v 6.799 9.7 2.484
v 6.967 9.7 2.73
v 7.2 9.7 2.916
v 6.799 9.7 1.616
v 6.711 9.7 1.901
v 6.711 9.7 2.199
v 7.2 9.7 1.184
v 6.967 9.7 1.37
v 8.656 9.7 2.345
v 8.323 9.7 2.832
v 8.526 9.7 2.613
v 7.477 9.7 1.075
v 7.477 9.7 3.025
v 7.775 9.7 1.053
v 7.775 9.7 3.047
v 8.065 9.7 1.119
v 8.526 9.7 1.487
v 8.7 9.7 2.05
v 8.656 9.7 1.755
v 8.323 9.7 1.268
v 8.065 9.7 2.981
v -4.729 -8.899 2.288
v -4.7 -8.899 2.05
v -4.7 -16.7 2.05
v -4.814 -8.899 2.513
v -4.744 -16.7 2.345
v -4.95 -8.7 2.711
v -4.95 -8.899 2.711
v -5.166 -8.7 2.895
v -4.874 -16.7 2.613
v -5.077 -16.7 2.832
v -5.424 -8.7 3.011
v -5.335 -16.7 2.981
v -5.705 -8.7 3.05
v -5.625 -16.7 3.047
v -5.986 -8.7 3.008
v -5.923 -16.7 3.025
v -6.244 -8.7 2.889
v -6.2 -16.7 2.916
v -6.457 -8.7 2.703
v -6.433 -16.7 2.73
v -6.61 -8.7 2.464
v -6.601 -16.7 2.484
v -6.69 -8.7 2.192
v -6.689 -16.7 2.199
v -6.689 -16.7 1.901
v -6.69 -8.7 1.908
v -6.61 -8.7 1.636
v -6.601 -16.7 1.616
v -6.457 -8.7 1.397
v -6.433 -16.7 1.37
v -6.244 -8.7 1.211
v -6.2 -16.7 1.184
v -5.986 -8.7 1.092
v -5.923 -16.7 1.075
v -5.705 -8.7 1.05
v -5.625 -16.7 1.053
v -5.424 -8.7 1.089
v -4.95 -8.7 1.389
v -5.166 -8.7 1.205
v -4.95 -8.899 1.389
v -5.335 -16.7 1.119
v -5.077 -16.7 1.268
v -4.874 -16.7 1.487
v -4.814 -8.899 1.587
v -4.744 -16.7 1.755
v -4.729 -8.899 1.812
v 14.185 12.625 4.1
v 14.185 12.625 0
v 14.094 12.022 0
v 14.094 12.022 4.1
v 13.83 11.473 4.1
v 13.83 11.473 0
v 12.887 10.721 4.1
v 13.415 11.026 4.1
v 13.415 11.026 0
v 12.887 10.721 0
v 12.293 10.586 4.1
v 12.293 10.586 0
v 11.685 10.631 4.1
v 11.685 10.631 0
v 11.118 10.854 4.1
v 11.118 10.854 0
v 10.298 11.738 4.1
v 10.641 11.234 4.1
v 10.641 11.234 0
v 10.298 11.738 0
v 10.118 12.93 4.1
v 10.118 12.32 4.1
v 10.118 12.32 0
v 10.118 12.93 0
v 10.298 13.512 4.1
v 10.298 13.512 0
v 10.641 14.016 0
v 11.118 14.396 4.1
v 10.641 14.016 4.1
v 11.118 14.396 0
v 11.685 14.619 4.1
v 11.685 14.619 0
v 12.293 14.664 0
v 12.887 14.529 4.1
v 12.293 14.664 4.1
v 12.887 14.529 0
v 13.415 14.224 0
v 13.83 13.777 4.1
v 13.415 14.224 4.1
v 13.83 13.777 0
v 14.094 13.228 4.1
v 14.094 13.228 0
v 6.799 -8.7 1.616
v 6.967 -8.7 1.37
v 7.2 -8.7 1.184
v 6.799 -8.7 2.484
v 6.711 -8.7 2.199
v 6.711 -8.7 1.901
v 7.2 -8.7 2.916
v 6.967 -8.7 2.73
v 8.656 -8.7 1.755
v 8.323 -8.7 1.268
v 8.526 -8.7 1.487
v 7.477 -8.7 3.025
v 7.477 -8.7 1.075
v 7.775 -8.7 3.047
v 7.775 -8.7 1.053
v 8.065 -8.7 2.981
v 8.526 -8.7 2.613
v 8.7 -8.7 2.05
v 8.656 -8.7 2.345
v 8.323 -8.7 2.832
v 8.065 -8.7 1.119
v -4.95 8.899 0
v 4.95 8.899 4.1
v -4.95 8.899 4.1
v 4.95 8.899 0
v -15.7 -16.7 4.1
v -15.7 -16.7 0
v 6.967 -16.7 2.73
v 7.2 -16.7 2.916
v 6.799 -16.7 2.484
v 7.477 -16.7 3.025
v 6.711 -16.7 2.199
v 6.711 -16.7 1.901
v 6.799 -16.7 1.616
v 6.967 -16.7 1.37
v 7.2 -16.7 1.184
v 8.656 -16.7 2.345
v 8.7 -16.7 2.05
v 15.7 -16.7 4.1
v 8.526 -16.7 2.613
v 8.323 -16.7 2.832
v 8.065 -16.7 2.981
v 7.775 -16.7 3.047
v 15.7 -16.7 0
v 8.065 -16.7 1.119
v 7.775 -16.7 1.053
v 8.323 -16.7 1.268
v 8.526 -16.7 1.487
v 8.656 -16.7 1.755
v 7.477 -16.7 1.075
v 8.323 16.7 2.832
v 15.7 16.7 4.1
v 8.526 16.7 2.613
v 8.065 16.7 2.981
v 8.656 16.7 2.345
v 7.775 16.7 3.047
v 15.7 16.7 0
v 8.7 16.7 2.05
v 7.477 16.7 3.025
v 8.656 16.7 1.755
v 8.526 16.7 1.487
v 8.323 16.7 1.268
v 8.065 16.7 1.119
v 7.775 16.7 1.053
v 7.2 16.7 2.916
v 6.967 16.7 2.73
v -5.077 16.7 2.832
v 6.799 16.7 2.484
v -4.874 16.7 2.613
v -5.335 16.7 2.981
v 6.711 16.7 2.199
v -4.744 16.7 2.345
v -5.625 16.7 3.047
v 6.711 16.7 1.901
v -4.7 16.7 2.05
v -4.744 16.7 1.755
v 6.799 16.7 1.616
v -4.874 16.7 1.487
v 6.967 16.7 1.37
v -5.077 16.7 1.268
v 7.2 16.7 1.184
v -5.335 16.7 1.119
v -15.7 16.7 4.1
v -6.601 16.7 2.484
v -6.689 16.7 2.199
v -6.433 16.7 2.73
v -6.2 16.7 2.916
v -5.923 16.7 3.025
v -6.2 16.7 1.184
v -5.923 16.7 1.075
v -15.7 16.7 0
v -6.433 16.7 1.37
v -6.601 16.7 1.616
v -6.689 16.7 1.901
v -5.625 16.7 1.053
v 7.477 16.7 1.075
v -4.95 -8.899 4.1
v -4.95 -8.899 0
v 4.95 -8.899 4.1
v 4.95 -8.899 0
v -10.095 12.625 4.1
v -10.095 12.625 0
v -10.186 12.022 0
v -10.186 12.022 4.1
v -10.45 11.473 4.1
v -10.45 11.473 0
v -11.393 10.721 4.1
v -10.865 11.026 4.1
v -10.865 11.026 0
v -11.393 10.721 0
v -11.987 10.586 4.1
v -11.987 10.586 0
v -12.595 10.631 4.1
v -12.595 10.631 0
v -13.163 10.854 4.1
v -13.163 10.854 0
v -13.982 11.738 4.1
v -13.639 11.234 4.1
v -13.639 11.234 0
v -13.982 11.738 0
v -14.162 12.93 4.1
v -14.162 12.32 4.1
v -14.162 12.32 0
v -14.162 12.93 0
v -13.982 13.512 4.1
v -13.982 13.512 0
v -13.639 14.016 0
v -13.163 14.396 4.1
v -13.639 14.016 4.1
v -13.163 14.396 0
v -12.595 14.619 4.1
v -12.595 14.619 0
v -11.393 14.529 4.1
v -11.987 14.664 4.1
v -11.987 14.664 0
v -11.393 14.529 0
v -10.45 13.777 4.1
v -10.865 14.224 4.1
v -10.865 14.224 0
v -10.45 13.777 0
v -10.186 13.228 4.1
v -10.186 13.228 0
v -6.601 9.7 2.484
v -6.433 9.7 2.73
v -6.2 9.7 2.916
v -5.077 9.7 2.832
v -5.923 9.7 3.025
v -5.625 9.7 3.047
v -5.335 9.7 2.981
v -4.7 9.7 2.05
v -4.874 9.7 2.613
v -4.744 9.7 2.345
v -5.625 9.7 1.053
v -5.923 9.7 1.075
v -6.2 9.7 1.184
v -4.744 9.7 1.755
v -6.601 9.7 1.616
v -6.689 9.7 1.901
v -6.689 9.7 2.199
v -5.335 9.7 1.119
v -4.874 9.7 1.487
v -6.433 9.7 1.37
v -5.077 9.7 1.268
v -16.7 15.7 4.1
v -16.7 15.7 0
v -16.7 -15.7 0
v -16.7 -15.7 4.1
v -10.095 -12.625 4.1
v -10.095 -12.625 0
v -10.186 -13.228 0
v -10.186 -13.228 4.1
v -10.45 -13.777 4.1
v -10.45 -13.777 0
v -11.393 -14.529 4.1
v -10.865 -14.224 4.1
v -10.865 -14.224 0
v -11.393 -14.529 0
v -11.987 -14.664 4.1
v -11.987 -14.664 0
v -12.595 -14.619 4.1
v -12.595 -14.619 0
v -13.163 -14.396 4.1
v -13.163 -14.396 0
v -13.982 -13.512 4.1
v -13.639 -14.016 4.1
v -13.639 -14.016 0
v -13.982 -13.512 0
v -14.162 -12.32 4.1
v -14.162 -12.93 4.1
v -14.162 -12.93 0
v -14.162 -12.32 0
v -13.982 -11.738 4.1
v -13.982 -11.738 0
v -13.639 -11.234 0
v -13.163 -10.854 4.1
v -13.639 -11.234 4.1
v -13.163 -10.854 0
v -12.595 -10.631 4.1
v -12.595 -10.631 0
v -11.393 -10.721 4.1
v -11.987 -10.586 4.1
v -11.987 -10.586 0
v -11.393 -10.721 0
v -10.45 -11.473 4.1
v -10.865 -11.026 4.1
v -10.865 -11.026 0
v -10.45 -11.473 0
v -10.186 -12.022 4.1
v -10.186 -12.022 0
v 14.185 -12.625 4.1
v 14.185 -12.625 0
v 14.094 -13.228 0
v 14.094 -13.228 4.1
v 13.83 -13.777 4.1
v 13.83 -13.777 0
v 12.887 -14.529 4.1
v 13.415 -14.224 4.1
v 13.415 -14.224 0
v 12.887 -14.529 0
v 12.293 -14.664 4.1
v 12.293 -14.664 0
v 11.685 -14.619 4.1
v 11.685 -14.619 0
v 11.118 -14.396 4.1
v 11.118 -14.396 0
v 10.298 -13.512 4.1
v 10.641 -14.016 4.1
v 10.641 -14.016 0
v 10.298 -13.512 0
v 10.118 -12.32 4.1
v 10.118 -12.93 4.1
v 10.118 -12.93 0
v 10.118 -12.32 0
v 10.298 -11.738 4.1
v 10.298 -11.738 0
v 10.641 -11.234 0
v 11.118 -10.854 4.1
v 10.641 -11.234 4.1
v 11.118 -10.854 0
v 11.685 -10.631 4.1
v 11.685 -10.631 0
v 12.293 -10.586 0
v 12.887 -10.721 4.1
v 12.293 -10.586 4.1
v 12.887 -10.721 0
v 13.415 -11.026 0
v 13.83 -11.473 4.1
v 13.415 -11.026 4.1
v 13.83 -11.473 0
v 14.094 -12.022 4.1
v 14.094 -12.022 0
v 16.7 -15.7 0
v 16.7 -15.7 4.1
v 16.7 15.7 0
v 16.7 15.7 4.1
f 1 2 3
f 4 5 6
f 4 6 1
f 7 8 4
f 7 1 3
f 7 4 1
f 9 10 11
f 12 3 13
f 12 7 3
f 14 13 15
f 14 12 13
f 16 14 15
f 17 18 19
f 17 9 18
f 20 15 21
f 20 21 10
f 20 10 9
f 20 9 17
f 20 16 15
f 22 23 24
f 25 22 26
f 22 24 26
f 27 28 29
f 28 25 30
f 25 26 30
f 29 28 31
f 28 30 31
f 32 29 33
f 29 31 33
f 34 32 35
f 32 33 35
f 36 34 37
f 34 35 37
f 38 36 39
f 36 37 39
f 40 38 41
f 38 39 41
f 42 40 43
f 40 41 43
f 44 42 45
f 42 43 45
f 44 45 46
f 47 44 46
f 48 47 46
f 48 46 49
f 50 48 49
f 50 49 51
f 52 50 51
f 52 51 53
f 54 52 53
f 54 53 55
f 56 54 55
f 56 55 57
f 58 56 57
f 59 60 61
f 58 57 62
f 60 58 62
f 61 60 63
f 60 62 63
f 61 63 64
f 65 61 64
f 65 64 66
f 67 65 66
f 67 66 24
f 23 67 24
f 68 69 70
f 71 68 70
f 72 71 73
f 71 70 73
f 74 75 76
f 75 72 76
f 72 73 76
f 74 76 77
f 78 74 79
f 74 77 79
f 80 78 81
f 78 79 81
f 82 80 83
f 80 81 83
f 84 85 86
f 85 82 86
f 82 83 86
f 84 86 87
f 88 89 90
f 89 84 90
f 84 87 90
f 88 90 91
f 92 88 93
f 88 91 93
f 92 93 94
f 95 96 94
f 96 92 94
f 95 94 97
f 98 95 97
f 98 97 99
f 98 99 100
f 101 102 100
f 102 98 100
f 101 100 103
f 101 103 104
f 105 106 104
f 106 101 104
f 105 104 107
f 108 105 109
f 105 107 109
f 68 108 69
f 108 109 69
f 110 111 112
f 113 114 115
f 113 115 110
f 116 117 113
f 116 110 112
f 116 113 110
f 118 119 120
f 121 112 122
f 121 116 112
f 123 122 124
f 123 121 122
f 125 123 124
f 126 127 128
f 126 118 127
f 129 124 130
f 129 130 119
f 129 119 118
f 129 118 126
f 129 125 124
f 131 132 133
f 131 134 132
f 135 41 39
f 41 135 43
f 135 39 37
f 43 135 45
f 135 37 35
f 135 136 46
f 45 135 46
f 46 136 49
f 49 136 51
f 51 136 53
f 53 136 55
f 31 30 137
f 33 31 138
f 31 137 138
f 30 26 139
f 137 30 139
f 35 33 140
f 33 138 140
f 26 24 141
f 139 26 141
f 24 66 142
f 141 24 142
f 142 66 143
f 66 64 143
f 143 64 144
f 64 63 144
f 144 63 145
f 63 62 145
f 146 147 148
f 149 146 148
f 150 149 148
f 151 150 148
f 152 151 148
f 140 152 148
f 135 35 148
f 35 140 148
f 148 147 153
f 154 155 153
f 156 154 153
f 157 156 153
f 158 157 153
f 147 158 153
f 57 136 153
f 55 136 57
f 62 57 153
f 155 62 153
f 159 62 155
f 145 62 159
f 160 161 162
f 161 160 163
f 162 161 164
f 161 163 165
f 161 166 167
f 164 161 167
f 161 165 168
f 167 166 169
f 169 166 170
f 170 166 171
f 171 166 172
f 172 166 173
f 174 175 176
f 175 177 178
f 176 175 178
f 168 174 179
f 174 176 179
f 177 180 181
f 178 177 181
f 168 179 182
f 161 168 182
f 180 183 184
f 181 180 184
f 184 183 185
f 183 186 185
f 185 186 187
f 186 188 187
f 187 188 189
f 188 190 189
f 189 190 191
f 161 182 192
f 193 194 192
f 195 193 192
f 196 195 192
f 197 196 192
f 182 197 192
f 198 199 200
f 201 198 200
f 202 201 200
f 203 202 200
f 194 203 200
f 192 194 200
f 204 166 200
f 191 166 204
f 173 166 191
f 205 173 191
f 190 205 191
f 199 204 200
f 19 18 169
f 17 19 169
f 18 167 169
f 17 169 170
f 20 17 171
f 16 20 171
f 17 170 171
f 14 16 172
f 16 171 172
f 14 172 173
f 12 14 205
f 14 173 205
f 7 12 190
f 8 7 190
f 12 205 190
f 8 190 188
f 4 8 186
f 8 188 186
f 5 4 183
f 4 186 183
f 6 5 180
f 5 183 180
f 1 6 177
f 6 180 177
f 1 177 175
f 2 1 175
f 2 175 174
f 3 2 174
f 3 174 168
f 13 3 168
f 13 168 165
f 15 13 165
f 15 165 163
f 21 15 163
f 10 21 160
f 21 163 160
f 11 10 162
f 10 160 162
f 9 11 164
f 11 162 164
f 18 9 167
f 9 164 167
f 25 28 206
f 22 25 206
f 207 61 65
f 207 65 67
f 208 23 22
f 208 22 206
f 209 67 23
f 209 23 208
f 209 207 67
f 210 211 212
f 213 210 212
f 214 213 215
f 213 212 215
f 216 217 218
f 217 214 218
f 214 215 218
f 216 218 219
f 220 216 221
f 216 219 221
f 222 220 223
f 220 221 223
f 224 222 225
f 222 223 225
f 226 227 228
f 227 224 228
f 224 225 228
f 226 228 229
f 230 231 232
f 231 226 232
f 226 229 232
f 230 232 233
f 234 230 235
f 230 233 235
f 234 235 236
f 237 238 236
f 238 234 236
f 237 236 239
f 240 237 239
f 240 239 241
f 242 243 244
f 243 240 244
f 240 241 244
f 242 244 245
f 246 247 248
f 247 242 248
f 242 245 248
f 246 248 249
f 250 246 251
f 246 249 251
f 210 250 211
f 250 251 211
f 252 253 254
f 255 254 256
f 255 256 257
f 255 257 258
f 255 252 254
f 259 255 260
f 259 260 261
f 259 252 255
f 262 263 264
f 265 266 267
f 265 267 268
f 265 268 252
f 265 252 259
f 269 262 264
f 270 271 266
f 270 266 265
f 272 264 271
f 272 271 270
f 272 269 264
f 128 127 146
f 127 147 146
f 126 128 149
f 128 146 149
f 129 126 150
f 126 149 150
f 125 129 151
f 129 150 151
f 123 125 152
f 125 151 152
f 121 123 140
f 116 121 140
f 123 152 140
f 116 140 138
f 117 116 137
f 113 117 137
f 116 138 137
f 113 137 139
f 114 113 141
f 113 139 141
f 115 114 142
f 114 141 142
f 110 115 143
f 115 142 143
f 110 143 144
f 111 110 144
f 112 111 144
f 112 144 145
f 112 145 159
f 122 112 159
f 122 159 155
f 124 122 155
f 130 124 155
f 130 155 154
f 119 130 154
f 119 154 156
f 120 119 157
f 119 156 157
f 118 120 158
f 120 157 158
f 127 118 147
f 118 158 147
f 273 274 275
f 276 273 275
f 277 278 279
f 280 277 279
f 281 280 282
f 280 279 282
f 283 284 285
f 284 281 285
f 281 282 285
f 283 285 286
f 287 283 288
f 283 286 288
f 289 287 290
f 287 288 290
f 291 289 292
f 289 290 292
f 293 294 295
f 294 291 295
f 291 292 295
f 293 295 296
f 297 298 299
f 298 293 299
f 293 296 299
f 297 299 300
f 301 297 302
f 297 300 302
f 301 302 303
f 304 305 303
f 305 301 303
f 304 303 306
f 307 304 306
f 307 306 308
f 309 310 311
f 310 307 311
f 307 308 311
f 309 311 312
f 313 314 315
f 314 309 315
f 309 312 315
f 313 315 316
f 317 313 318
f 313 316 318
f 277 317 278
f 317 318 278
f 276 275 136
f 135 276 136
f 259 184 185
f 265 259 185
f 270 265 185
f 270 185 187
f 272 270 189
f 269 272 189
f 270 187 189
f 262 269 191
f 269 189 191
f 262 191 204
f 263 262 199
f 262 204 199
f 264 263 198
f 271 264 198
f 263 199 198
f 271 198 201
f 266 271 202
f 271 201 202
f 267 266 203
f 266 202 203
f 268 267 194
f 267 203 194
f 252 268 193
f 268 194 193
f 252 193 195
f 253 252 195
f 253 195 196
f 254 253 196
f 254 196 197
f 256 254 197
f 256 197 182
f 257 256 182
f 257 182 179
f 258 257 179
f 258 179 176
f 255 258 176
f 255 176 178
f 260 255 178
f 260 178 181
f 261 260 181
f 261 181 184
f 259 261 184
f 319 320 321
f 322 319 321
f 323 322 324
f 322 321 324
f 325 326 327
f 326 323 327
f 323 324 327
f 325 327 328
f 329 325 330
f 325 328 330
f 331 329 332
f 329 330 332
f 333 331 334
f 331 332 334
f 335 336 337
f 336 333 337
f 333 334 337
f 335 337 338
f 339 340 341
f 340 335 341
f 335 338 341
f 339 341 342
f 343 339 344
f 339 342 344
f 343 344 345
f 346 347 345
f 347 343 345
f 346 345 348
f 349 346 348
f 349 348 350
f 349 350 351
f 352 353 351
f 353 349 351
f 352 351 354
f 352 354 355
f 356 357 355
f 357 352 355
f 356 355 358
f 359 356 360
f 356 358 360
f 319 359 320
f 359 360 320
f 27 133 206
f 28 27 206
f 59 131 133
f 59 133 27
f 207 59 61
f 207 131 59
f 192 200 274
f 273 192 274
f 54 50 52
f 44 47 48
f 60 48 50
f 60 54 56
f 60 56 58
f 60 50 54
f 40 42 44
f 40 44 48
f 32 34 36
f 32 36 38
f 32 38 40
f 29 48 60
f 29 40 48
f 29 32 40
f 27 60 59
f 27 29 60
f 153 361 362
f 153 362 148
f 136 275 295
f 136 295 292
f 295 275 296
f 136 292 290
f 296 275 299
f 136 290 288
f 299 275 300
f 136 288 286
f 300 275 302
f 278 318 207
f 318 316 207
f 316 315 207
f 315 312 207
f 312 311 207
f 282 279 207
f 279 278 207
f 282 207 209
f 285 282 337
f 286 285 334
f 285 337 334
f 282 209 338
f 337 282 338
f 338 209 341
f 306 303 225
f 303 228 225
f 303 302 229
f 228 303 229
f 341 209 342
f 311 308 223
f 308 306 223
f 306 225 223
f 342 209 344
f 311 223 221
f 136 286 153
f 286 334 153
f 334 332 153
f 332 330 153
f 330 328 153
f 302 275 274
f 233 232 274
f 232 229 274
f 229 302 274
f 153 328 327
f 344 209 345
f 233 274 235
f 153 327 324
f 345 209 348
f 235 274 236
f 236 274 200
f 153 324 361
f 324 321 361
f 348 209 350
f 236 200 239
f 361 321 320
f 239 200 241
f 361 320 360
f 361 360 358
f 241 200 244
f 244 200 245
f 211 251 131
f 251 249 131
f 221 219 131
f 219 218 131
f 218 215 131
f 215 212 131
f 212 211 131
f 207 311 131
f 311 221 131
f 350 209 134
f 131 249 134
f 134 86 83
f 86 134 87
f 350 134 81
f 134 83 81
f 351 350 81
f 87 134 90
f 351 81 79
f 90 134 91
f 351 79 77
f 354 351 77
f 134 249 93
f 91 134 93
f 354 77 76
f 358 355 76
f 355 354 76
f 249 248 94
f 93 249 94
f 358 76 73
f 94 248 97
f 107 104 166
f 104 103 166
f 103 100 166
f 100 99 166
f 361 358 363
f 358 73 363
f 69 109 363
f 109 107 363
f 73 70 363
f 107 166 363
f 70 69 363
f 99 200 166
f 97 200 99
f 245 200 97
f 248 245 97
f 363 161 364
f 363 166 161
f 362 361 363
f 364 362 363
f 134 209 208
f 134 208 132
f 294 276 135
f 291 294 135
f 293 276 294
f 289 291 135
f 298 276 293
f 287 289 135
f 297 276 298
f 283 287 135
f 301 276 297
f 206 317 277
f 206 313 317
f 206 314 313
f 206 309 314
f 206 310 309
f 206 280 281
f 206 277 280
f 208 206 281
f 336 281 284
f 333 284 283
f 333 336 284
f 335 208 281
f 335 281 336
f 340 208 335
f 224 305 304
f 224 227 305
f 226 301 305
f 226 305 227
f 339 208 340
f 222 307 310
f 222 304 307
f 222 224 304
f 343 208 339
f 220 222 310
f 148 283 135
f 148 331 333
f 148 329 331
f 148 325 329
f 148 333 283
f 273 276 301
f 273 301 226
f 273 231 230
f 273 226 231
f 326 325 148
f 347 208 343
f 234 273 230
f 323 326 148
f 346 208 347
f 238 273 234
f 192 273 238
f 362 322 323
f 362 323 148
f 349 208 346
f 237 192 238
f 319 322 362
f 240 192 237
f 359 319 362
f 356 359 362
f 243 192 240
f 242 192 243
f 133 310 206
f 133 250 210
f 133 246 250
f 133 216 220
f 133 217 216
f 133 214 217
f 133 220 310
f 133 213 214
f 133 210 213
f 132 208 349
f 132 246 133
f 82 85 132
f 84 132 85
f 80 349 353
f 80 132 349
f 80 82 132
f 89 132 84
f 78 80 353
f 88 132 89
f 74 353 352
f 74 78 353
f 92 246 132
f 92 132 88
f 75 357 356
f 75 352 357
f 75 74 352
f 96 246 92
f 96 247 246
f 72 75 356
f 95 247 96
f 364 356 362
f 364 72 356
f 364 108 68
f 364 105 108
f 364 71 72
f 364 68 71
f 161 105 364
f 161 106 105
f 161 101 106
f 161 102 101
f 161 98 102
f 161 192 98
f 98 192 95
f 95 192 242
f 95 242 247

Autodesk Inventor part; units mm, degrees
ref_plane "YZ Plane" through (0, 0, 0) normal (1, 0, 0) x (0, 1, 0)
ref_plane "XZ Plane" through (0, 0, 0) normal (0, 1, 0) x (-1, 0, 0)
ref_plane "XY Plane" through (0, 0, 0) normal (0, 0, 1) x (1, 0, 0)
sketch "Sketch3" plane through (0, 0, 0) normal (0, 0, 1) x (1, 0, 0)
  line L0 (-15.7, -16.7) -> (15.7, -16.7)
  line L1 (16.7, -15.7) -> (16.7, 15.7)
  line L2 (15.7, 16.7) -> (-15.7, 16.7)
  line L3 (-16.7, 15.7) -> (-16.7, -15.7)
  line L4 (-16.7, -16.7) -> (16.7, 16.7) construction
  line L5 (16.7, -16.7) -> (-16.7, 16.7) construction
  line L6 (-15.7, 16.7) -> (-16.7, 15.7)
  line L7 (15.7, 16.7) -> (16.7, 15.7)
  line L8 (16.7, -15.7) -> (15.7, -16.7)
  line L9 (-16.7, -15.7) -> (-15.7, -16.7)
  line L10 (-4.9497, -8.8994) -> (4.9497, -8.8994)
  line L11 (4.9497, -8.8994) -> (4.9497, 8.8994)
  line L12 (4.9497, 8.8994) -> (-4.9497, 8.8994)
  line L13 (-4.9497, 8.8994) -> (-4.9497, -8.8994)
  line L14 (-4.9497, -8.8994) -> (4.9497, 8.8994) construction
  line L15 (4.9497, -8.8994) -> (-4.9497, 8.8994) construction
  circle A0 centre (-12.14, 12.625) radius 2.045
  circle A1 centre (12.14, 12.625) radius 2.045
  line L16 (0, -16.7) -> (0, 16.7) construction
  circle A2 centre (-12.14, -12.625) radius 2.045
  circle A3 centre (12.14, -12.625) radius 2.045
  line L17 (12.14, 12.625) -> (-12.14, 12.625) construction
  line L18 (-12.14, 12.625) -> (-12.14, -12.625) construction
  line L19 (-12.14, -12.625) -> (12.14, -12.625) construction
  line L20 (12.14, -12.625) -> (12.14, 12.625) construction
  line L21 (-16.7, 0) -> (16.7, 0) construction
  point P0 (0, 0)
  point P1 (0, 0)
  dimension "d0" = 33.4
  dimension "d1" = 33.4
  dimension "d2" = 1
  dimension "d3" = 1
  dimension "d4" = 1
  dimension "d5" = 1
  dimension "d6" = 1
  dimension "d7" = 1
  dimension "d8" = 1
  dimension "d9" = 1
  dimension "d10" = 9.8994
  dimension "d11" = 17.7988
  dimension "d12" = 4.09
  dimension "d13" = 4.09
  dimension "d17" = 4.09
  dimension "d19" = 24.28
  dimension "d20" = 25.25
  dimension "d21" = 4.09
  dimension "d22" = 12.625
  dimension "d23" = 12.14
extrude "Extrusion1" add sketch "Sketch3" along normal blind 4.1
sketch "Sketch6" plane through (-15.7, 16.7, 0) normal (0, 1, 0) x (1, 0, 0)
  circle A0 centre (10, -2.05) radius 1
  circle A1 centre (23.4, -2.05) radius 1
  line L0 (-1, 0) -> (-1, -4.1) projected
  line L1 (32.4, 0) -> (32.4, -4.1) projected
  line L2 (31.4, 0) -> (0, 0) projected
  line L3 (31.4, -4.1) -> (0, -4.1) projected
  point P0 (15.7, 0)
  dimension "d54" = 2
  dimension "d55" = 2
  dimension "d57" = 9
  dimension "d58" = 13.4
  dimension "d59" = 2.05
  dimension "d60" = 2.05
sketch "Sketch7" plane through (-15.7, -16.7, 0) normal (0, -1, 0) x (1, 0, 0)
  circle A0 centre (23.4, 2.05) radius 1
  circle A1 centre (10, 2.05) radius 1
  line L0 (0, 0) -> (31.4, 0) projected
  line L1 (0, 4.1) -> (31.4, 4.1) projected
  line L2 (32.4, 0) -> (32.4, 4.1) projected
  line L3 (-1, 0) -> (-1, 4.1) projected
  point P0 (15.7, 0)
  dimension "d61" = 2
  dimension "d62" = 2
  dimension "d63" = 2.05
  dimension "d64" = 2.05
  dimension "d65" = 2.05
  dimension "d67" = 11
  dimension "d81" = 13.4
extrude "Extrusion4" cut sketch "Sketch7" against normal blind 8
extrude "Extrusion5" cut sketch "Sketch6" against normal blind 7
thread "Thread5" size "M2x0.4" class "6H" standard "ANSI Metric M Profile" full length
thread "Thread6" size "M2x0.4" class "6H" standard "ANSI Metric M Profile" full length
thread "Thread7" size "M2x0.4" class "6H" standard "ANSI Metric M Profile" full length
thread "Thread8" size "M2x0.4" class "6H" standard "ANSI Metric M Profile" full length
equation "\"d3\" = d2"
equation "\"d5\" = d4"
equation "\"d6\" = d4"
equation "\"d7\" = d6"
equation "\"d8\" = d4"
equation "\"d9\" = d8"
properties part number "WG18FLANGE" material "Brass, Soft Yellow"
